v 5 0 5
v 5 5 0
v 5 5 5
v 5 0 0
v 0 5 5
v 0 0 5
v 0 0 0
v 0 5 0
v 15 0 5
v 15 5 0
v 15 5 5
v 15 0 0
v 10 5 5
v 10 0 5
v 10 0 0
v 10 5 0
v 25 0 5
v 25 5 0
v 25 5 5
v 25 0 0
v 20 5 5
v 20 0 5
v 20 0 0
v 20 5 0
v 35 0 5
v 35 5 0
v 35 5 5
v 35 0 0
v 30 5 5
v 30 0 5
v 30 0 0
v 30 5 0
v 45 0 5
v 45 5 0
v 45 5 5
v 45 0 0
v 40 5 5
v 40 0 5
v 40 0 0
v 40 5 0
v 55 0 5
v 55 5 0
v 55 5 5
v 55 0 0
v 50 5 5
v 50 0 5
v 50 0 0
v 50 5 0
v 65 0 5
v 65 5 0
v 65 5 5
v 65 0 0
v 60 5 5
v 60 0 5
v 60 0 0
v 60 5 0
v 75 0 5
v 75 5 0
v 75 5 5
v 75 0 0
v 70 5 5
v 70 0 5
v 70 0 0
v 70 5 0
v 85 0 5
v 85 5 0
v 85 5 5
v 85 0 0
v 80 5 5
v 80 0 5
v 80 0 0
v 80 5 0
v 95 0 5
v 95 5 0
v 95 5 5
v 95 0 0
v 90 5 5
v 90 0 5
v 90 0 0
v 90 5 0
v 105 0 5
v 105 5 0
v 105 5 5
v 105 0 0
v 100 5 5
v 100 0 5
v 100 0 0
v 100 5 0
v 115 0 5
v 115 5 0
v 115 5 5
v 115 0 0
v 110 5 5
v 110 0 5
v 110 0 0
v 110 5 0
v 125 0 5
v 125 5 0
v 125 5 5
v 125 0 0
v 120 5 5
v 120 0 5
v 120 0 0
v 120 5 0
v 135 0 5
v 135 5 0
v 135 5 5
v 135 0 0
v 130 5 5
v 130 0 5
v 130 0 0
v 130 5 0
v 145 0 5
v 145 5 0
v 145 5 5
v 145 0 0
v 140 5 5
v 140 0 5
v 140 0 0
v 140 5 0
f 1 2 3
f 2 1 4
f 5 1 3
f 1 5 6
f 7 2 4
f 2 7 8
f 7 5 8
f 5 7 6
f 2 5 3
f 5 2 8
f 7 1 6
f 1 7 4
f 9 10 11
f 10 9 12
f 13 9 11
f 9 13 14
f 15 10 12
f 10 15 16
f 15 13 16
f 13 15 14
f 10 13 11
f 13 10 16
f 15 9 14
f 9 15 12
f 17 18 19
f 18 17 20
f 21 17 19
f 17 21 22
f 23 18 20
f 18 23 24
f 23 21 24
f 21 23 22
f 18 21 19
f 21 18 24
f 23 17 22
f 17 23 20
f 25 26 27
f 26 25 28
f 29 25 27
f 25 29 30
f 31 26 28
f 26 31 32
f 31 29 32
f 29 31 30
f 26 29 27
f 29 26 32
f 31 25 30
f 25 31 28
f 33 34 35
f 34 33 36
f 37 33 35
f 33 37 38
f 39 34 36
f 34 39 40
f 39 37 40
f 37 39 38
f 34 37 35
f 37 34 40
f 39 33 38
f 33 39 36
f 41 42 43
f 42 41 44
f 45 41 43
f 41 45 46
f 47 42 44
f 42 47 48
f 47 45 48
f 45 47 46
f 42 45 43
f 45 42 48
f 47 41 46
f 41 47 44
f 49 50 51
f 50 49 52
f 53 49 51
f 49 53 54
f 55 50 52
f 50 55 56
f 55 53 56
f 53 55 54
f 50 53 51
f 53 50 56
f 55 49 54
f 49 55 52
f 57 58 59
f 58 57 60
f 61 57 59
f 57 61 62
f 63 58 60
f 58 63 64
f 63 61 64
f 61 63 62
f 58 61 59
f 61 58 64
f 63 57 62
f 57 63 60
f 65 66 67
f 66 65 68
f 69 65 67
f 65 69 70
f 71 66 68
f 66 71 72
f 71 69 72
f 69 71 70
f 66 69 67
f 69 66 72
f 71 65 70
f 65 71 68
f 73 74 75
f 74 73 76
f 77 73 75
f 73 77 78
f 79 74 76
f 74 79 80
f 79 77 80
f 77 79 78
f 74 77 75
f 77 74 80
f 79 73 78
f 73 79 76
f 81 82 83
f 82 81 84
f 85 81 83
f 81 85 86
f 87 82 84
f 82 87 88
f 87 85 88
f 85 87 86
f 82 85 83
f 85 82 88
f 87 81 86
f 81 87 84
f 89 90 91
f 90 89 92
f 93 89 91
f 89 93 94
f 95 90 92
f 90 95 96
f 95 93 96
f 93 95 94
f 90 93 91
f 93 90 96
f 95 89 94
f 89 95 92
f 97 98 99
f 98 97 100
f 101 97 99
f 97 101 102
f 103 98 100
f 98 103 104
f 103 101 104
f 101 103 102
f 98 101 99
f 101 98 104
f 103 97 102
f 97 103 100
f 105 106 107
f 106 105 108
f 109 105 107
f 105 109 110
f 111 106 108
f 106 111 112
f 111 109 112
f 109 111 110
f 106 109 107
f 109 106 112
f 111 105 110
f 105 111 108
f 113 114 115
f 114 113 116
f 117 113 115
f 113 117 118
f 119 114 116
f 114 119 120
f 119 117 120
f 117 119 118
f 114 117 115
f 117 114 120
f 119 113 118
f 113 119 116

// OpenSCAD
color("red") cube(5);
translate([10,0,0]) color("red", filament = 3) cube(5);
translate([20,0,0]) color("red", filament = 4) cube(5);
translate([30,0,0]) color("blue", filament = 3) cube(5);
translate([40,0,0]) color("green") cube(5);
translate([50,0,0]) color("yellow", filament = 1) cube(5);
translate([60,0,0]) cube(5);
translate([70,0,0]) color("white", filament = 0) cube(5);
translate([80,0,0]) color("white", filament = 17) cube(5);
translate([90,0,0]) color("white", filament = 2.5) cube(5);
translate([100,0,0]) color("white", filament = "2") cube(5);
translate([110,0,0]) color("pink", filament = 16) cube(5);
translate([120,0,0]) color("Red", filament = 5) cube(5);
translate([130,0,0]) color("#c74240", filament = 6) cube(5);
translate([140,0,0]) color("red", alpha = 0.5, filament = 7) cube(5);
